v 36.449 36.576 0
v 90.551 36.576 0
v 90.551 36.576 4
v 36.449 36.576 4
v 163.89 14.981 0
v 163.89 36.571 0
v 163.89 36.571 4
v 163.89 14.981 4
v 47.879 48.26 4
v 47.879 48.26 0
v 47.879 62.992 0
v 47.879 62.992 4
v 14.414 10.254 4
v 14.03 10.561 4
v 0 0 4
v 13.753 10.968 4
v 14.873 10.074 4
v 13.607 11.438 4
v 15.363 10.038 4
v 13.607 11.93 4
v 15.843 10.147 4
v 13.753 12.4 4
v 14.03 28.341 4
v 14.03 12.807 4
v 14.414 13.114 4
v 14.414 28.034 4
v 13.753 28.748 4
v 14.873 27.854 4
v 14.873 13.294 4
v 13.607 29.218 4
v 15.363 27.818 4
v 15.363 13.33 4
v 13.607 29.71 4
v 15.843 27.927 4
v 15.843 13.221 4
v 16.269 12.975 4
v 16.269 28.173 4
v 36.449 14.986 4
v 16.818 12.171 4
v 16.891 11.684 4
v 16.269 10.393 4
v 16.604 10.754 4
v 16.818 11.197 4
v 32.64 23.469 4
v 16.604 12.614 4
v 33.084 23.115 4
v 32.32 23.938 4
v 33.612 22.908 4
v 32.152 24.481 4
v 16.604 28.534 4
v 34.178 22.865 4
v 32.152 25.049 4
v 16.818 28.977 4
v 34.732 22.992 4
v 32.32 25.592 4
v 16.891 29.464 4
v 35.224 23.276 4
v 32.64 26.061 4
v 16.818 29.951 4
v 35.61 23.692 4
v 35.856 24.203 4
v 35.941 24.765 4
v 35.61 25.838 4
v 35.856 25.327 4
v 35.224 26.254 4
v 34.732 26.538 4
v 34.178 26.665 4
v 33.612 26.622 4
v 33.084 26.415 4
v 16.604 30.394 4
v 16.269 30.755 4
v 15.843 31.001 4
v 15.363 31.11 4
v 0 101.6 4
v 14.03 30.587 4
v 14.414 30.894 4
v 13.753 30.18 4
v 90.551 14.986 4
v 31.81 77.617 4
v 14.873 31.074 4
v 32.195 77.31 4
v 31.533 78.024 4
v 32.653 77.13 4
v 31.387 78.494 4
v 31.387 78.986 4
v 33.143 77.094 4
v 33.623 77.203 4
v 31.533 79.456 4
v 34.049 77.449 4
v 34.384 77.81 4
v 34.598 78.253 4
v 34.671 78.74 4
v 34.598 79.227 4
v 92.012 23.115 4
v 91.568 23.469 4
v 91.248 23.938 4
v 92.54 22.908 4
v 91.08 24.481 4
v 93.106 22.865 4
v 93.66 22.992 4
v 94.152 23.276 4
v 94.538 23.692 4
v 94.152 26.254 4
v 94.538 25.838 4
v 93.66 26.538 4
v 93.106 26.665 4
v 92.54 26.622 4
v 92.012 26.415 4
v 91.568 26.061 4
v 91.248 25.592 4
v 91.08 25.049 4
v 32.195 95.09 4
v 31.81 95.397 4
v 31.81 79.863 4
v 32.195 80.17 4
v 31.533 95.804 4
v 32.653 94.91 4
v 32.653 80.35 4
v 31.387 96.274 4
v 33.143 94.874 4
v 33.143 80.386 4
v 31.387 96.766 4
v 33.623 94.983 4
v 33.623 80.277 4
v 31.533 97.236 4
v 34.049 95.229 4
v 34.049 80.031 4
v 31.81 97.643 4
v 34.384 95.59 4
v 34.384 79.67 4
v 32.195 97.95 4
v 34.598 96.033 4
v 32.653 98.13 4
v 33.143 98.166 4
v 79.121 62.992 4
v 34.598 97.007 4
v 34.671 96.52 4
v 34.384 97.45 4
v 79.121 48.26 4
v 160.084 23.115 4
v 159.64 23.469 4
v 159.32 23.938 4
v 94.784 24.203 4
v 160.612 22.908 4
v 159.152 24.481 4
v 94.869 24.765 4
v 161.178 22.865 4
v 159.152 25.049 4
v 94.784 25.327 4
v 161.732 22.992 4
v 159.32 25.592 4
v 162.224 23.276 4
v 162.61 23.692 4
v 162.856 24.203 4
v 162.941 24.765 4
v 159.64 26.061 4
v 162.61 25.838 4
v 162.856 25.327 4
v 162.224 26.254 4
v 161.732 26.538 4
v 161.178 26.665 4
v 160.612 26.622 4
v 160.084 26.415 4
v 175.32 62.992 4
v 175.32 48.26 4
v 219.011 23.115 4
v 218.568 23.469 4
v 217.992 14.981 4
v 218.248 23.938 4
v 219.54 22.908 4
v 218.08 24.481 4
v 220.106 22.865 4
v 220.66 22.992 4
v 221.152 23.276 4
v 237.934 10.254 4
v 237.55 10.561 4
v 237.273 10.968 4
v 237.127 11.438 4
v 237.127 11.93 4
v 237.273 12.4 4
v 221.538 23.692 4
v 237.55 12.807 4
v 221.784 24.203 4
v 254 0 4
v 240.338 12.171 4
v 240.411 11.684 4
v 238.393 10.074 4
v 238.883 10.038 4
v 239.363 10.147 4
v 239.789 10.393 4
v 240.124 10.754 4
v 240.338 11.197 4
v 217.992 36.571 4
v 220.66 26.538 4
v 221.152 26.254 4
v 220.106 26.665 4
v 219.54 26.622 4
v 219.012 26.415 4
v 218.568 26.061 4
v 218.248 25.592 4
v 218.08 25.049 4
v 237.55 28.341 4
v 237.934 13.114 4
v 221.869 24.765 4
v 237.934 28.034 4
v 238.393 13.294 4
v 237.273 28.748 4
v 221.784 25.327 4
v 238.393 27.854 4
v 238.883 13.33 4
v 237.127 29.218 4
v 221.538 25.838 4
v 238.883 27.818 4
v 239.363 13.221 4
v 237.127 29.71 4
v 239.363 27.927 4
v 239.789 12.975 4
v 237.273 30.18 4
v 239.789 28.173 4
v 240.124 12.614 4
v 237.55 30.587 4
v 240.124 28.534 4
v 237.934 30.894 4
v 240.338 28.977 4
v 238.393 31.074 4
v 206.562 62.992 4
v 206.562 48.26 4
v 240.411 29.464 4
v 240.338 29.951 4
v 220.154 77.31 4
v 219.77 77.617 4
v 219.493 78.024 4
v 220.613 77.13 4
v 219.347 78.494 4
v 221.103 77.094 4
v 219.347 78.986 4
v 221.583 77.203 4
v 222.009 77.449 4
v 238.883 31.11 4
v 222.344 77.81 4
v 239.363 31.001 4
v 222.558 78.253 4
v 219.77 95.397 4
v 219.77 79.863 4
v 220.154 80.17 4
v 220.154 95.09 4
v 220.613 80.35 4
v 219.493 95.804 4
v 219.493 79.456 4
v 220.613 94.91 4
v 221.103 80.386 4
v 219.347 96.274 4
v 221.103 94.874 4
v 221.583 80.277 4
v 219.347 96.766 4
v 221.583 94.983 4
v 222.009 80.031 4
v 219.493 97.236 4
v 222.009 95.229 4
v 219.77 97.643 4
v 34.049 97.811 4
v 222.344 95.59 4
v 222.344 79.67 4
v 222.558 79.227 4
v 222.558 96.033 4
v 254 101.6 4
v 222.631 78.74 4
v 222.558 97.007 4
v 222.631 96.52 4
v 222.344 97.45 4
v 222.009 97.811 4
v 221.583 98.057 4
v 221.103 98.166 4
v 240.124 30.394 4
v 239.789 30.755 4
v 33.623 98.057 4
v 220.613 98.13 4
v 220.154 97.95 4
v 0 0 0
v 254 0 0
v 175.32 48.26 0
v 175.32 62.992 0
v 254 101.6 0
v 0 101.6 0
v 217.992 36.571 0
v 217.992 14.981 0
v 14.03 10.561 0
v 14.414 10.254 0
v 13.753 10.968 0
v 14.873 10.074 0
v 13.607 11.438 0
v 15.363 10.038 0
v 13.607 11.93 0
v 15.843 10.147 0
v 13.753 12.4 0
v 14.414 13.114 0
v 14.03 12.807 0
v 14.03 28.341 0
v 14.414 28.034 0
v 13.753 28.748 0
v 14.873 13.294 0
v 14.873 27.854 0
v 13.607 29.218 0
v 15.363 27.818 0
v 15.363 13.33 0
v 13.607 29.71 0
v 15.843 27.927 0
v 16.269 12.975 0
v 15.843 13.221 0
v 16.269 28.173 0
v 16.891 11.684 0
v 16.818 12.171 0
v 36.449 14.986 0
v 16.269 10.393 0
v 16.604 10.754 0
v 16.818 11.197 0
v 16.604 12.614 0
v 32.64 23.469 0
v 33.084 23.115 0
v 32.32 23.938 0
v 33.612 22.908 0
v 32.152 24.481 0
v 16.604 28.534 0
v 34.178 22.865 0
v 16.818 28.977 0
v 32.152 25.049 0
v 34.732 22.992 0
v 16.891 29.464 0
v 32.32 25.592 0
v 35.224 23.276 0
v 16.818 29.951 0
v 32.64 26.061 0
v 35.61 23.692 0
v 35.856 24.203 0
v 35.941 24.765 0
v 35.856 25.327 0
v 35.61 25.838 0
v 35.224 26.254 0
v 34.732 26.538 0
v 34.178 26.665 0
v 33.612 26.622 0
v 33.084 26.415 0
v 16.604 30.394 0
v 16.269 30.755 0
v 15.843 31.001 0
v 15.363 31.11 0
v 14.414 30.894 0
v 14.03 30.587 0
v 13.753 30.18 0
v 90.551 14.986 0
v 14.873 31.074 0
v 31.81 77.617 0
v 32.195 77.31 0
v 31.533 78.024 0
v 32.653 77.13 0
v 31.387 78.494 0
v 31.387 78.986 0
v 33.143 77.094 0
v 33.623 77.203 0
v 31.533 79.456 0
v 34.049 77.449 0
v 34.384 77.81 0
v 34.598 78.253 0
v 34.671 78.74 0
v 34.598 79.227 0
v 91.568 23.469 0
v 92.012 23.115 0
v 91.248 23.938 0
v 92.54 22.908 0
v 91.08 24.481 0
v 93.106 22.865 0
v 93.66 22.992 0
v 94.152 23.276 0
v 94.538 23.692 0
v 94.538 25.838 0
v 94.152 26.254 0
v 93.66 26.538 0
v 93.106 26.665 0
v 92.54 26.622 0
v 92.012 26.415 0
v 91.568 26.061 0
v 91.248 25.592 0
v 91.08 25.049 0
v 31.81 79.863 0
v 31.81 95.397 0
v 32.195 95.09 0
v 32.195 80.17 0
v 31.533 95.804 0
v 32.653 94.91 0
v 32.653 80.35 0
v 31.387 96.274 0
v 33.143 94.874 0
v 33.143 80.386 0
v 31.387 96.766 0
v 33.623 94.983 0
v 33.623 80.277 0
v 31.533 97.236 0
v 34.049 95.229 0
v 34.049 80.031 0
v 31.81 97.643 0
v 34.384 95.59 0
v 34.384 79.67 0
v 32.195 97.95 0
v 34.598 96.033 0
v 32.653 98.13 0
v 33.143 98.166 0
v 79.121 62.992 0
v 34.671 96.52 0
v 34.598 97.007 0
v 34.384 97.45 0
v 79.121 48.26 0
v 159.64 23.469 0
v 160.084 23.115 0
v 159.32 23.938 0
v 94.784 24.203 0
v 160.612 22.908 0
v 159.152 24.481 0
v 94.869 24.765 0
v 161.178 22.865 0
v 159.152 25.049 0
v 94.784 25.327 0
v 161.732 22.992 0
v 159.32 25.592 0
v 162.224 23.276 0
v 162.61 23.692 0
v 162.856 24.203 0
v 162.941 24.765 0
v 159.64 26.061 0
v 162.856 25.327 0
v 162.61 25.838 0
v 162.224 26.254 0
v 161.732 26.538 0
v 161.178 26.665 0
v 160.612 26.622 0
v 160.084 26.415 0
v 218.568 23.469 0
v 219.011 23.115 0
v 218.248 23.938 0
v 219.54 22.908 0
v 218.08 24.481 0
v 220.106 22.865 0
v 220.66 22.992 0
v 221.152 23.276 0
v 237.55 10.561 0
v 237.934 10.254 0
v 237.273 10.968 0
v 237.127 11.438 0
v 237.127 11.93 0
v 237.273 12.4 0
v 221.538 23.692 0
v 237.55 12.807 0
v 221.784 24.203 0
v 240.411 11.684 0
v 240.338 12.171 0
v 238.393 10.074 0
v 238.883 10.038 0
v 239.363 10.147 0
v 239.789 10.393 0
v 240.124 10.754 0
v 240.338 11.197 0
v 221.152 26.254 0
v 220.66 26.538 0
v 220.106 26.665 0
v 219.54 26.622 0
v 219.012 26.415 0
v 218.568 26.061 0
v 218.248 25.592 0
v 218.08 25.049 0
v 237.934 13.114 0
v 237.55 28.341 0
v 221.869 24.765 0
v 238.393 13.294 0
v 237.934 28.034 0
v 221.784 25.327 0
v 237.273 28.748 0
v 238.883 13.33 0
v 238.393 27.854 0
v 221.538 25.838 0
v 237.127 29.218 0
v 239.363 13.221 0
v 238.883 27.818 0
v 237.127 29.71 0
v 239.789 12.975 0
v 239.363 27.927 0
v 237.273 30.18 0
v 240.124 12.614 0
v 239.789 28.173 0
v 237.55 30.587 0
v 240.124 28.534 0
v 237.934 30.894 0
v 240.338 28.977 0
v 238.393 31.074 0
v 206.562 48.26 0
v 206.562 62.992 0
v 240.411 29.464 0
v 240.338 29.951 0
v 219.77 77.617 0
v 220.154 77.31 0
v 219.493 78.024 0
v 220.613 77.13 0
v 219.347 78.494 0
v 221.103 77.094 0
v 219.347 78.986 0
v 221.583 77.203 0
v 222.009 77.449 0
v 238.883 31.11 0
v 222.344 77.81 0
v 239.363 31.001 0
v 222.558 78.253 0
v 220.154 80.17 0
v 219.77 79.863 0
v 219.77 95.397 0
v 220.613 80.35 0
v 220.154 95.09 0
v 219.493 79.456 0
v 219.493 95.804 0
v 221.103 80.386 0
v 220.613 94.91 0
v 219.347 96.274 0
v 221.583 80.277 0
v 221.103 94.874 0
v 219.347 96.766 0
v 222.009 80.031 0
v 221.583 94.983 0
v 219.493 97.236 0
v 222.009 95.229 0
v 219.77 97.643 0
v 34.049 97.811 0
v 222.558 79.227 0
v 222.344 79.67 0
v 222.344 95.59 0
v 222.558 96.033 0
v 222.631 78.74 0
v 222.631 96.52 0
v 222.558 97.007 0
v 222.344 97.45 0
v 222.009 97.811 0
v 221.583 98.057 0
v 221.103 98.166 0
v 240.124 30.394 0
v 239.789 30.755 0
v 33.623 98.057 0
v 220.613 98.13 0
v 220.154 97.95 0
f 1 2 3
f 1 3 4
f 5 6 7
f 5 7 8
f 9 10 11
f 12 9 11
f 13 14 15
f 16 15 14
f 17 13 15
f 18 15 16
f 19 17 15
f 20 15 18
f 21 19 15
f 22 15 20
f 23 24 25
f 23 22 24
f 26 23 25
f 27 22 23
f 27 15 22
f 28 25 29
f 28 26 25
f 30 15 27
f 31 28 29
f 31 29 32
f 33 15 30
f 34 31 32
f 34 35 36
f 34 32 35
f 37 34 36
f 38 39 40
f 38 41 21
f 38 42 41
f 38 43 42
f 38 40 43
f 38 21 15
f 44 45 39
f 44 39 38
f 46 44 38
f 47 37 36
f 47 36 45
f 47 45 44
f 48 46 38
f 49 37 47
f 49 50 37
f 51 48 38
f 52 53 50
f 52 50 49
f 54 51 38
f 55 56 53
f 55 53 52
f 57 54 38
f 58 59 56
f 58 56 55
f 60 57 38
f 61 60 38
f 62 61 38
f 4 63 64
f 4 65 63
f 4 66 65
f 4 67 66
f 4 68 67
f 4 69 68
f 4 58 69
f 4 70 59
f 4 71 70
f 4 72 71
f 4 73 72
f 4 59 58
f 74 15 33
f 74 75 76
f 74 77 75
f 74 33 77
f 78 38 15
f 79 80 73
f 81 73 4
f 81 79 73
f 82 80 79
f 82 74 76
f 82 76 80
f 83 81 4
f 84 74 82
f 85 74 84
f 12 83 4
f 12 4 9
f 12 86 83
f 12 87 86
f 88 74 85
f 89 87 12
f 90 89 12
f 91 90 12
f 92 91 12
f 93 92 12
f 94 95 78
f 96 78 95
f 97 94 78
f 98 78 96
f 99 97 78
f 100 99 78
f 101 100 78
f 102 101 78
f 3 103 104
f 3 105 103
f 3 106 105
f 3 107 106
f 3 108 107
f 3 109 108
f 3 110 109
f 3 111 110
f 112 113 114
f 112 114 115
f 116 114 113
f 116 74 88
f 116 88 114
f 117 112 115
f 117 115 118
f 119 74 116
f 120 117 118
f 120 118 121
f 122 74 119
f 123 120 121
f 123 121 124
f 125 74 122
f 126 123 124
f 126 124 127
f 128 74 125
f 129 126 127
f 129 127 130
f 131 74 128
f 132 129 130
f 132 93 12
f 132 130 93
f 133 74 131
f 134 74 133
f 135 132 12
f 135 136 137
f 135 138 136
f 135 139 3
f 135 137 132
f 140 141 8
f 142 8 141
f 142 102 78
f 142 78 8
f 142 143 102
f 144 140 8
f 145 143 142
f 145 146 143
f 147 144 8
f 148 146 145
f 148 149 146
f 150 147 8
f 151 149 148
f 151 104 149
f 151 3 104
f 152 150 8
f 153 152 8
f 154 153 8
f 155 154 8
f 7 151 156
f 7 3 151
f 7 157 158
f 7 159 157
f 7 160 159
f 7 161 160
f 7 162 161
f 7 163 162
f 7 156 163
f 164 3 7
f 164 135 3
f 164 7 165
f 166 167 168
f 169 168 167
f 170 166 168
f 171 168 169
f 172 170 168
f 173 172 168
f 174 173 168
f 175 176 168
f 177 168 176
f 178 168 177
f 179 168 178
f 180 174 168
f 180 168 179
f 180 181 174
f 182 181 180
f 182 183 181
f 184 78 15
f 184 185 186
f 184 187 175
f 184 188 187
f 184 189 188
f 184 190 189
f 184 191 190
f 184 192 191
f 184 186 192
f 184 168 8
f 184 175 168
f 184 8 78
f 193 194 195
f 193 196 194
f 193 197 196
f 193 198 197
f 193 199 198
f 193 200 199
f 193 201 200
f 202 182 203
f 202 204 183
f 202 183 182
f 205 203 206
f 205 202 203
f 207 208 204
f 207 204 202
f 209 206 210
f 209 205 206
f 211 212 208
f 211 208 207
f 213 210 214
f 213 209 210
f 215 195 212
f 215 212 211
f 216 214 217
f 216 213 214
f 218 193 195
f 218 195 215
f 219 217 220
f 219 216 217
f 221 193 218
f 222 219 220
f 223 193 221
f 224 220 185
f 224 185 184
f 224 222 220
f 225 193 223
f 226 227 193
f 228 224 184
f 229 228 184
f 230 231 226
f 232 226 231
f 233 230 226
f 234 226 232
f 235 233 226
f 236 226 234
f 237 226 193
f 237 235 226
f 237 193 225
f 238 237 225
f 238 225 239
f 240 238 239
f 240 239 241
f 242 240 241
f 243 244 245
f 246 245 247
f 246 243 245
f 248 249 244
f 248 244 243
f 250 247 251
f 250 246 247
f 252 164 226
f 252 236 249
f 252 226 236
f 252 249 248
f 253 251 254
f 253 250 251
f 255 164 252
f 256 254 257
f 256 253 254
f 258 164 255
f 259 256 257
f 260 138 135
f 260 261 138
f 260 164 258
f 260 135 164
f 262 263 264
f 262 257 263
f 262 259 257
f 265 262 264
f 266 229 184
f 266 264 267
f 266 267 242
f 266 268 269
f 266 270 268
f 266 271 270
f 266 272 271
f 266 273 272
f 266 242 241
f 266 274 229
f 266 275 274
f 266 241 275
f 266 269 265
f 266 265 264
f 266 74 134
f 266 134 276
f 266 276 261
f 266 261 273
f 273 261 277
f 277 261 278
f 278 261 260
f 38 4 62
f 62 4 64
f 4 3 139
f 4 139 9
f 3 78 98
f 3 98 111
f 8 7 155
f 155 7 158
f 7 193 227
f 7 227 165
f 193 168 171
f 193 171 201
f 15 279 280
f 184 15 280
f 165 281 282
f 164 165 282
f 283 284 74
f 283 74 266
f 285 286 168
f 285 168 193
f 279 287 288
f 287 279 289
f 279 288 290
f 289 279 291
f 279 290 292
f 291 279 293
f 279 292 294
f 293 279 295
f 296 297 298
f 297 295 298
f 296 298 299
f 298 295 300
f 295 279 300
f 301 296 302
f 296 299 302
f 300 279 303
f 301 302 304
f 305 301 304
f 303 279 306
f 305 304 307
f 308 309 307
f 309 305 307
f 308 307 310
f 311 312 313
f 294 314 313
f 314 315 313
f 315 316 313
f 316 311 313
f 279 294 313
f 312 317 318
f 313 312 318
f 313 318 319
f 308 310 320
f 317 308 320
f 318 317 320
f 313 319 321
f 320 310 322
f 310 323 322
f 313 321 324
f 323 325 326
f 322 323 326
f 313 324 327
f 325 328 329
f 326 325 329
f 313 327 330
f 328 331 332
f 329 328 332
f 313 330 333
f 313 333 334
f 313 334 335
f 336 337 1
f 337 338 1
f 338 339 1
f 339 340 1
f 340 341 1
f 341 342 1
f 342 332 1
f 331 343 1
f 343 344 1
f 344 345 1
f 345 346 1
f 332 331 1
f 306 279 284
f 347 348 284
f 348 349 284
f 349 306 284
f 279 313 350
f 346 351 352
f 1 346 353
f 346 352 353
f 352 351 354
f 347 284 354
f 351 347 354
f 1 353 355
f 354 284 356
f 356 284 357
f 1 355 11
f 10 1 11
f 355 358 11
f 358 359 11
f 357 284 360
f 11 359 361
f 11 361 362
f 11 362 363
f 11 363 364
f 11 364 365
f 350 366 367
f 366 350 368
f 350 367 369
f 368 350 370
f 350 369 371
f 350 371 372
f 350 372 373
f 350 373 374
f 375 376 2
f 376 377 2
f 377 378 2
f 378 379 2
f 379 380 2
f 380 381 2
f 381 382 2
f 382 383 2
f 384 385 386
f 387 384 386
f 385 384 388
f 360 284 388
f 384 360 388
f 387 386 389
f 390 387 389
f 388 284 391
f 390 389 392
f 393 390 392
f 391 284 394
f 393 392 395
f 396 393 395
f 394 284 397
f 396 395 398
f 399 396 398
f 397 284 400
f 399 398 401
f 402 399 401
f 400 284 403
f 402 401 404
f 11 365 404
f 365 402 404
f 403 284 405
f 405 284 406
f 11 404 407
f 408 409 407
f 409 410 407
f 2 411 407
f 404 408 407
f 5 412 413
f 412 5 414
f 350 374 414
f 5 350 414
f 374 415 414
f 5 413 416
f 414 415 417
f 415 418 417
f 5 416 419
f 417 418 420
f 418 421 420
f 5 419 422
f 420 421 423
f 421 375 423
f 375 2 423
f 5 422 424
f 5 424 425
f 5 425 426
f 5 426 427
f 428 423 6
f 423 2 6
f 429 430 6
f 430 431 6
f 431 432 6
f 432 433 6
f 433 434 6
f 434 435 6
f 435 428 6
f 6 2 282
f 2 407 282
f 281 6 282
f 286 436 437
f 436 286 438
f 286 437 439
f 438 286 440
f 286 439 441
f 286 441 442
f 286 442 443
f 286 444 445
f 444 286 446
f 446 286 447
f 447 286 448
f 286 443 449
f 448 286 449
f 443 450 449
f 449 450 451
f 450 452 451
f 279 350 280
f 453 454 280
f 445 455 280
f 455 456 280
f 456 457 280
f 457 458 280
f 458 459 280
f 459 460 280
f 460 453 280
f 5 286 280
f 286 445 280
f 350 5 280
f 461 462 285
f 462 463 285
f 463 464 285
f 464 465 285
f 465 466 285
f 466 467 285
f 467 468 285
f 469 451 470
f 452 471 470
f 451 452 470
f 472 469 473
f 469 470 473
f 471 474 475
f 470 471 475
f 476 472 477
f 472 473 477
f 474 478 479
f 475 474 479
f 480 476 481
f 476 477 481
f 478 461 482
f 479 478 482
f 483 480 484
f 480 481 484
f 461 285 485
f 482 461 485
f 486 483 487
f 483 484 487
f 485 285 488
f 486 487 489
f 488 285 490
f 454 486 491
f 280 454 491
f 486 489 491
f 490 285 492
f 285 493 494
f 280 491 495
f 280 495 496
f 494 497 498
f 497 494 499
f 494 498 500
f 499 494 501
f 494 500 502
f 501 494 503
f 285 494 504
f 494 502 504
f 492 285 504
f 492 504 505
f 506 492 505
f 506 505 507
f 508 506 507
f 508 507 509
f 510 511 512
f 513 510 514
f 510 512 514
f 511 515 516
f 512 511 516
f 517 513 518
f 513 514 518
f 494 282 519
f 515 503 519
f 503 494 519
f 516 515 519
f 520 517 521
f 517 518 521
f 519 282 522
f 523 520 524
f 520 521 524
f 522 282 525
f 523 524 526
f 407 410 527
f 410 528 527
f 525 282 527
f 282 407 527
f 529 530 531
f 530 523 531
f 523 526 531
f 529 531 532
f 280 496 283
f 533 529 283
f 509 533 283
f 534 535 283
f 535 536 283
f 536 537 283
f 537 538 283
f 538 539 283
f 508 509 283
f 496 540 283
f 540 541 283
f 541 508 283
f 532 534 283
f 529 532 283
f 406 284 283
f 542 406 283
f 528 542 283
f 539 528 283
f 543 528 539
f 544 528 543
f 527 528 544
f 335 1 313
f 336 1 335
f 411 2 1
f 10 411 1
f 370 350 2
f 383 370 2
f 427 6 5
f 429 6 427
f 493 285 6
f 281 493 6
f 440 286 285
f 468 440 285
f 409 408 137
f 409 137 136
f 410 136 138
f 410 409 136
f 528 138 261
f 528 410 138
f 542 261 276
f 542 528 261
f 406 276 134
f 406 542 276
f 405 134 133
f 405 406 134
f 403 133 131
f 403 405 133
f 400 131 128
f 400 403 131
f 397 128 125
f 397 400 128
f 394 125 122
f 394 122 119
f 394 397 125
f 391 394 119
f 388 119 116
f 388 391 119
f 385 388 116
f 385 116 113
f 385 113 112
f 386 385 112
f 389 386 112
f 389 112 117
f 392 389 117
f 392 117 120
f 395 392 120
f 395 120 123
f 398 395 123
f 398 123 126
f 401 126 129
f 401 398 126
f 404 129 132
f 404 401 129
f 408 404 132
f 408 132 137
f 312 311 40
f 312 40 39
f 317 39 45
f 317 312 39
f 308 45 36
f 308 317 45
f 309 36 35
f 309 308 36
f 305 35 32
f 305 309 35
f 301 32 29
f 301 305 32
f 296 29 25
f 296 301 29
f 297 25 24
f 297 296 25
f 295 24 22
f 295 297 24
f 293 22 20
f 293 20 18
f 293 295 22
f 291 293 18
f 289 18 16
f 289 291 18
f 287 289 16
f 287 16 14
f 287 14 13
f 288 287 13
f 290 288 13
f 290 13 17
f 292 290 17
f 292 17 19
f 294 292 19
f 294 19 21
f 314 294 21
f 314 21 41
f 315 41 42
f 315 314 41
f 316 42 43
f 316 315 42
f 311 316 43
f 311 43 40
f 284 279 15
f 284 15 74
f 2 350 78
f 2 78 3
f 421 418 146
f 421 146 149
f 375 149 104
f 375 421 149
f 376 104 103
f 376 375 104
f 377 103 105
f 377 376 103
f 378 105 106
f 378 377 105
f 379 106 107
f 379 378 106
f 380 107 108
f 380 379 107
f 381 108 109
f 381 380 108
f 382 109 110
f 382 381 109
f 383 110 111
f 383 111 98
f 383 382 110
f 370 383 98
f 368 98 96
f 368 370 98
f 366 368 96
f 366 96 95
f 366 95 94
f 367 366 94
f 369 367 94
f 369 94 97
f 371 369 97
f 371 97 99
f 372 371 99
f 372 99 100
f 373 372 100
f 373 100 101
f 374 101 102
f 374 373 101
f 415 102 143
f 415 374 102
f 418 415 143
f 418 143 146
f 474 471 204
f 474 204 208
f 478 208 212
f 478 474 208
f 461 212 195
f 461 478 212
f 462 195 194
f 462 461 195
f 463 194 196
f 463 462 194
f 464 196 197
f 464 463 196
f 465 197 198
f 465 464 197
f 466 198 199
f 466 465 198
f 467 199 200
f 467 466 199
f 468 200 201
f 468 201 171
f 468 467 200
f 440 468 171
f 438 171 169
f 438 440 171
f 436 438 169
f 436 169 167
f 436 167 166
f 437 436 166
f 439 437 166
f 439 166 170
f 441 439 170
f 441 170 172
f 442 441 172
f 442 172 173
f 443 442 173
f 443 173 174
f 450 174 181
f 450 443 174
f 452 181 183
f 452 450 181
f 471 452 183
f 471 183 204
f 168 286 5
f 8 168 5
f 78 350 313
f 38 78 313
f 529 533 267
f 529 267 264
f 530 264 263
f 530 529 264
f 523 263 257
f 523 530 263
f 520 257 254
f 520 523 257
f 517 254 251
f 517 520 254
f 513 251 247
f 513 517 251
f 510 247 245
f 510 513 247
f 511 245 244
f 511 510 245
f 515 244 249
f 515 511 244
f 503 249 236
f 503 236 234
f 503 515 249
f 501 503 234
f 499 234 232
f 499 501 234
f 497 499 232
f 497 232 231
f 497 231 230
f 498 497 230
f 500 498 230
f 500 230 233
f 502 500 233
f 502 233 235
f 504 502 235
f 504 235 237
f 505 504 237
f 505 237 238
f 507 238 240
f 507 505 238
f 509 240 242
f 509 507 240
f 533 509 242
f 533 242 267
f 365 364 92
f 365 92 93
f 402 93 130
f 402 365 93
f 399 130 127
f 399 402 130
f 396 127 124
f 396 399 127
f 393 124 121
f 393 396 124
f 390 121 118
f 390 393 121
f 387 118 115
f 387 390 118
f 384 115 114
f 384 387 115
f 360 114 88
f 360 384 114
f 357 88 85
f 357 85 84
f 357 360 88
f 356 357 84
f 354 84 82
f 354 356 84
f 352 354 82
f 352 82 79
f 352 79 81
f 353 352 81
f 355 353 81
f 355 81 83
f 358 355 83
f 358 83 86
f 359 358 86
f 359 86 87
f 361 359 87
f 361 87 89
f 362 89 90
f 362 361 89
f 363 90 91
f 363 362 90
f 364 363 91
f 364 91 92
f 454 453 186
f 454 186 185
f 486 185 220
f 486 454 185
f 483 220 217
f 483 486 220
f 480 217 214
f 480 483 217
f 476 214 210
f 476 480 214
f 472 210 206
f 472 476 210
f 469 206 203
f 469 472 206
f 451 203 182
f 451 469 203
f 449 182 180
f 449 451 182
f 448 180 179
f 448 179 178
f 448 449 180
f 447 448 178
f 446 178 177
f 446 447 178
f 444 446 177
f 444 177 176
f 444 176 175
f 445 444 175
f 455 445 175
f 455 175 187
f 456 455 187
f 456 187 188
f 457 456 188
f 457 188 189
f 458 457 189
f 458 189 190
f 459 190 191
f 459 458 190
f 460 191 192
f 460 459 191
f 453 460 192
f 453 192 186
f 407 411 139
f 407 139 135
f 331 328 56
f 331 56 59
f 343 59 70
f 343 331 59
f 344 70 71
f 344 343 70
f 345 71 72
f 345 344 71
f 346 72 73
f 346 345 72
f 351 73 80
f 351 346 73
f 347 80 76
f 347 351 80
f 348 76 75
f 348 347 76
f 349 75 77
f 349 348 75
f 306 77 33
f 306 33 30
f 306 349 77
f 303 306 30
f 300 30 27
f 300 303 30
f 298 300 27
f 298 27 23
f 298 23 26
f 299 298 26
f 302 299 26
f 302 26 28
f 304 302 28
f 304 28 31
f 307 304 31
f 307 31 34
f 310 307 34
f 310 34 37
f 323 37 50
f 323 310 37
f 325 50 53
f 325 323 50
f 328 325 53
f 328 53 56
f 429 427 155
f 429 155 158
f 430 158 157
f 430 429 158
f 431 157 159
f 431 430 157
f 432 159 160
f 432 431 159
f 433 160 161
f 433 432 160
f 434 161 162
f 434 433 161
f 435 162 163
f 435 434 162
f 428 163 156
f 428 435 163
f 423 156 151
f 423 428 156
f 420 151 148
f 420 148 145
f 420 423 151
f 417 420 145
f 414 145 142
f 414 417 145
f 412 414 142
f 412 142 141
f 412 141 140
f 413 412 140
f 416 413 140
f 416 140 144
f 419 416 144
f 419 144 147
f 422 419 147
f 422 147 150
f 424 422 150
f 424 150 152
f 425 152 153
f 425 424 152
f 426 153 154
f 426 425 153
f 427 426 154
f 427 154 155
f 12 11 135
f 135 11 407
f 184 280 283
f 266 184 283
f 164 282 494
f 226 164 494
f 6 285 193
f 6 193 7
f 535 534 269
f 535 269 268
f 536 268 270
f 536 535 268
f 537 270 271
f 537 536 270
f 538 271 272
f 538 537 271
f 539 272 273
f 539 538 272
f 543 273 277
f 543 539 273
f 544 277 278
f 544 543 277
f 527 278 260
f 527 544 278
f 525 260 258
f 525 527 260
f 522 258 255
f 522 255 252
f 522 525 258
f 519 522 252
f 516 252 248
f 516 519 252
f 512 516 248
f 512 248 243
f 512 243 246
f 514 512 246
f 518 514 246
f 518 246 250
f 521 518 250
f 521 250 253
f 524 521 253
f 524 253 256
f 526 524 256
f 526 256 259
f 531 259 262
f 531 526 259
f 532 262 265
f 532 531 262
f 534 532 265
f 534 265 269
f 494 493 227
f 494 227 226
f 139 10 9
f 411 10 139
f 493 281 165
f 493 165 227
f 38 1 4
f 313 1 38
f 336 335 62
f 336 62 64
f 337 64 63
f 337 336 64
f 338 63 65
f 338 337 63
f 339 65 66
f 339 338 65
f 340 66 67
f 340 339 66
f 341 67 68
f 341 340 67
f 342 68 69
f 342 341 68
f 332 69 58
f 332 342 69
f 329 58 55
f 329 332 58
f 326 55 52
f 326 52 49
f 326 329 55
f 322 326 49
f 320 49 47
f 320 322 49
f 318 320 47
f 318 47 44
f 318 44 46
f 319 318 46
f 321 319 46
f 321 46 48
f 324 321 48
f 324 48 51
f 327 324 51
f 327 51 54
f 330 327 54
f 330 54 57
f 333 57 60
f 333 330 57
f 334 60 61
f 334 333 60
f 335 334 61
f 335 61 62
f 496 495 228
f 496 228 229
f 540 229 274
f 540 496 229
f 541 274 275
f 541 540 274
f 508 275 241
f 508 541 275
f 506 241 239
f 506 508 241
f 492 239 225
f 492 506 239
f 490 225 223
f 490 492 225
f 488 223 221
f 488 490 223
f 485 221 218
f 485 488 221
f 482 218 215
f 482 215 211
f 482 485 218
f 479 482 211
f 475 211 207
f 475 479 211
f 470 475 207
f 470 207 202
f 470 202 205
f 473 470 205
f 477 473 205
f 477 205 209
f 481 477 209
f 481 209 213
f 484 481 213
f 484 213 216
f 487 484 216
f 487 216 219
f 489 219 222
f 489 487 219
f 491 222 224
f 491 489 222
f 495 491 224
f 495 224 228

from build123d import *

# Parameters (mm, degrees)
SKETCH1_W           = 254
SKETCH1_H           = 101.6
SKETCH1_R           = 1.905
SKETCH1_R_2         = 1.651
SKETCH1_W_2         = 31.242
SKETCH1_H_2         = 14.732
BOSS_EXTRUDE1_DEPTH = 4


with BuildPart() as part:
    # Sketch1 → Boss-Extrude1 (new body)
    with BuildSketch(Plane.XY):
        with Locations((127, 50.8)):
            Rectangle(SKETCH1_W, SKETCH1_H)
        with Locations((34.036, 24.765)):
            Circle(SKETCH1_R, mode=Mode.SUBTRACT)
        with Locations((92.964, 24.765)):
            Circle(SKETCH1_R, mode=Mode.SUBTRACT)
        with Locations((161.036, 24.765)):
            Circle(SKETCH1_R, mode=Mode.SUBTRACT)
        with Locations((219.964, 24.765)):
            Circle(SKETCH1_R, mode=Mode.SUBTRACT)
        with Locations((33.02, 78.74)):
            Circle(SKETCH1_R_2, mode=Mode.SUBTRACT)
        with Locations((33.02, 96.52)):
            Circle(SKETCH1_R_2, mode=Mode.SUBTRACT)
        with Locations((220.98, 78.74)):
            Circle(SKETCH1_R_2, mode=Mode.SUBTRACT)
        with Locations((220.98, 96.52)):
            Circle(SKETCH1_R_2, mode=Mode.SUBTRACT)
        with Locations((15.24, 11.684)):
            Circle(SKETCH1_R_2, mode=Mode.SUBTRACT)
        with Locations((15.24, 29.464)):
            Circle(SKETCH1_R_2, mode=Mode.SUBTRACT)
        with Locations((238.76, 29.464)):
            Circle(SKETCH1_R_2, mode=Mode.SUBTRACT)
        with Locations((238.76, 11.684)):
            Circle(SKETCH1_R_2, mode=Mode.SUBTRACT)
        Polygon((63.5, 14.986), (90.551, 14.986), (90.551, 36.576), (36.449, 36.576), (36.449, 14.986), align=None, mode=Mode.SUBTRACT)
        Polygon((190.5, 14.98050389), (217.992332172, 14.98050389), (217.992332172, 36.57050389), (163.890331935, 36.57050389), (163.890331935, 14.98050389), align=None, mode=Mode.SUBTRACT)
        with Locations((63.5, 55.626)):
            Rectangle(SKETCH1_W_2, SKETCH1_H_2, mode=Mode.SUBTRACT)
        with Locations((190.941332053, 55.626)):
            Rectangle(SKETCH1_W_2, SKETCH1_H_2, mode=Mode.SUBTRACT)
    extrude(amount=BOSS_EXTRUDE1_DEPTH)


solid = part.part
